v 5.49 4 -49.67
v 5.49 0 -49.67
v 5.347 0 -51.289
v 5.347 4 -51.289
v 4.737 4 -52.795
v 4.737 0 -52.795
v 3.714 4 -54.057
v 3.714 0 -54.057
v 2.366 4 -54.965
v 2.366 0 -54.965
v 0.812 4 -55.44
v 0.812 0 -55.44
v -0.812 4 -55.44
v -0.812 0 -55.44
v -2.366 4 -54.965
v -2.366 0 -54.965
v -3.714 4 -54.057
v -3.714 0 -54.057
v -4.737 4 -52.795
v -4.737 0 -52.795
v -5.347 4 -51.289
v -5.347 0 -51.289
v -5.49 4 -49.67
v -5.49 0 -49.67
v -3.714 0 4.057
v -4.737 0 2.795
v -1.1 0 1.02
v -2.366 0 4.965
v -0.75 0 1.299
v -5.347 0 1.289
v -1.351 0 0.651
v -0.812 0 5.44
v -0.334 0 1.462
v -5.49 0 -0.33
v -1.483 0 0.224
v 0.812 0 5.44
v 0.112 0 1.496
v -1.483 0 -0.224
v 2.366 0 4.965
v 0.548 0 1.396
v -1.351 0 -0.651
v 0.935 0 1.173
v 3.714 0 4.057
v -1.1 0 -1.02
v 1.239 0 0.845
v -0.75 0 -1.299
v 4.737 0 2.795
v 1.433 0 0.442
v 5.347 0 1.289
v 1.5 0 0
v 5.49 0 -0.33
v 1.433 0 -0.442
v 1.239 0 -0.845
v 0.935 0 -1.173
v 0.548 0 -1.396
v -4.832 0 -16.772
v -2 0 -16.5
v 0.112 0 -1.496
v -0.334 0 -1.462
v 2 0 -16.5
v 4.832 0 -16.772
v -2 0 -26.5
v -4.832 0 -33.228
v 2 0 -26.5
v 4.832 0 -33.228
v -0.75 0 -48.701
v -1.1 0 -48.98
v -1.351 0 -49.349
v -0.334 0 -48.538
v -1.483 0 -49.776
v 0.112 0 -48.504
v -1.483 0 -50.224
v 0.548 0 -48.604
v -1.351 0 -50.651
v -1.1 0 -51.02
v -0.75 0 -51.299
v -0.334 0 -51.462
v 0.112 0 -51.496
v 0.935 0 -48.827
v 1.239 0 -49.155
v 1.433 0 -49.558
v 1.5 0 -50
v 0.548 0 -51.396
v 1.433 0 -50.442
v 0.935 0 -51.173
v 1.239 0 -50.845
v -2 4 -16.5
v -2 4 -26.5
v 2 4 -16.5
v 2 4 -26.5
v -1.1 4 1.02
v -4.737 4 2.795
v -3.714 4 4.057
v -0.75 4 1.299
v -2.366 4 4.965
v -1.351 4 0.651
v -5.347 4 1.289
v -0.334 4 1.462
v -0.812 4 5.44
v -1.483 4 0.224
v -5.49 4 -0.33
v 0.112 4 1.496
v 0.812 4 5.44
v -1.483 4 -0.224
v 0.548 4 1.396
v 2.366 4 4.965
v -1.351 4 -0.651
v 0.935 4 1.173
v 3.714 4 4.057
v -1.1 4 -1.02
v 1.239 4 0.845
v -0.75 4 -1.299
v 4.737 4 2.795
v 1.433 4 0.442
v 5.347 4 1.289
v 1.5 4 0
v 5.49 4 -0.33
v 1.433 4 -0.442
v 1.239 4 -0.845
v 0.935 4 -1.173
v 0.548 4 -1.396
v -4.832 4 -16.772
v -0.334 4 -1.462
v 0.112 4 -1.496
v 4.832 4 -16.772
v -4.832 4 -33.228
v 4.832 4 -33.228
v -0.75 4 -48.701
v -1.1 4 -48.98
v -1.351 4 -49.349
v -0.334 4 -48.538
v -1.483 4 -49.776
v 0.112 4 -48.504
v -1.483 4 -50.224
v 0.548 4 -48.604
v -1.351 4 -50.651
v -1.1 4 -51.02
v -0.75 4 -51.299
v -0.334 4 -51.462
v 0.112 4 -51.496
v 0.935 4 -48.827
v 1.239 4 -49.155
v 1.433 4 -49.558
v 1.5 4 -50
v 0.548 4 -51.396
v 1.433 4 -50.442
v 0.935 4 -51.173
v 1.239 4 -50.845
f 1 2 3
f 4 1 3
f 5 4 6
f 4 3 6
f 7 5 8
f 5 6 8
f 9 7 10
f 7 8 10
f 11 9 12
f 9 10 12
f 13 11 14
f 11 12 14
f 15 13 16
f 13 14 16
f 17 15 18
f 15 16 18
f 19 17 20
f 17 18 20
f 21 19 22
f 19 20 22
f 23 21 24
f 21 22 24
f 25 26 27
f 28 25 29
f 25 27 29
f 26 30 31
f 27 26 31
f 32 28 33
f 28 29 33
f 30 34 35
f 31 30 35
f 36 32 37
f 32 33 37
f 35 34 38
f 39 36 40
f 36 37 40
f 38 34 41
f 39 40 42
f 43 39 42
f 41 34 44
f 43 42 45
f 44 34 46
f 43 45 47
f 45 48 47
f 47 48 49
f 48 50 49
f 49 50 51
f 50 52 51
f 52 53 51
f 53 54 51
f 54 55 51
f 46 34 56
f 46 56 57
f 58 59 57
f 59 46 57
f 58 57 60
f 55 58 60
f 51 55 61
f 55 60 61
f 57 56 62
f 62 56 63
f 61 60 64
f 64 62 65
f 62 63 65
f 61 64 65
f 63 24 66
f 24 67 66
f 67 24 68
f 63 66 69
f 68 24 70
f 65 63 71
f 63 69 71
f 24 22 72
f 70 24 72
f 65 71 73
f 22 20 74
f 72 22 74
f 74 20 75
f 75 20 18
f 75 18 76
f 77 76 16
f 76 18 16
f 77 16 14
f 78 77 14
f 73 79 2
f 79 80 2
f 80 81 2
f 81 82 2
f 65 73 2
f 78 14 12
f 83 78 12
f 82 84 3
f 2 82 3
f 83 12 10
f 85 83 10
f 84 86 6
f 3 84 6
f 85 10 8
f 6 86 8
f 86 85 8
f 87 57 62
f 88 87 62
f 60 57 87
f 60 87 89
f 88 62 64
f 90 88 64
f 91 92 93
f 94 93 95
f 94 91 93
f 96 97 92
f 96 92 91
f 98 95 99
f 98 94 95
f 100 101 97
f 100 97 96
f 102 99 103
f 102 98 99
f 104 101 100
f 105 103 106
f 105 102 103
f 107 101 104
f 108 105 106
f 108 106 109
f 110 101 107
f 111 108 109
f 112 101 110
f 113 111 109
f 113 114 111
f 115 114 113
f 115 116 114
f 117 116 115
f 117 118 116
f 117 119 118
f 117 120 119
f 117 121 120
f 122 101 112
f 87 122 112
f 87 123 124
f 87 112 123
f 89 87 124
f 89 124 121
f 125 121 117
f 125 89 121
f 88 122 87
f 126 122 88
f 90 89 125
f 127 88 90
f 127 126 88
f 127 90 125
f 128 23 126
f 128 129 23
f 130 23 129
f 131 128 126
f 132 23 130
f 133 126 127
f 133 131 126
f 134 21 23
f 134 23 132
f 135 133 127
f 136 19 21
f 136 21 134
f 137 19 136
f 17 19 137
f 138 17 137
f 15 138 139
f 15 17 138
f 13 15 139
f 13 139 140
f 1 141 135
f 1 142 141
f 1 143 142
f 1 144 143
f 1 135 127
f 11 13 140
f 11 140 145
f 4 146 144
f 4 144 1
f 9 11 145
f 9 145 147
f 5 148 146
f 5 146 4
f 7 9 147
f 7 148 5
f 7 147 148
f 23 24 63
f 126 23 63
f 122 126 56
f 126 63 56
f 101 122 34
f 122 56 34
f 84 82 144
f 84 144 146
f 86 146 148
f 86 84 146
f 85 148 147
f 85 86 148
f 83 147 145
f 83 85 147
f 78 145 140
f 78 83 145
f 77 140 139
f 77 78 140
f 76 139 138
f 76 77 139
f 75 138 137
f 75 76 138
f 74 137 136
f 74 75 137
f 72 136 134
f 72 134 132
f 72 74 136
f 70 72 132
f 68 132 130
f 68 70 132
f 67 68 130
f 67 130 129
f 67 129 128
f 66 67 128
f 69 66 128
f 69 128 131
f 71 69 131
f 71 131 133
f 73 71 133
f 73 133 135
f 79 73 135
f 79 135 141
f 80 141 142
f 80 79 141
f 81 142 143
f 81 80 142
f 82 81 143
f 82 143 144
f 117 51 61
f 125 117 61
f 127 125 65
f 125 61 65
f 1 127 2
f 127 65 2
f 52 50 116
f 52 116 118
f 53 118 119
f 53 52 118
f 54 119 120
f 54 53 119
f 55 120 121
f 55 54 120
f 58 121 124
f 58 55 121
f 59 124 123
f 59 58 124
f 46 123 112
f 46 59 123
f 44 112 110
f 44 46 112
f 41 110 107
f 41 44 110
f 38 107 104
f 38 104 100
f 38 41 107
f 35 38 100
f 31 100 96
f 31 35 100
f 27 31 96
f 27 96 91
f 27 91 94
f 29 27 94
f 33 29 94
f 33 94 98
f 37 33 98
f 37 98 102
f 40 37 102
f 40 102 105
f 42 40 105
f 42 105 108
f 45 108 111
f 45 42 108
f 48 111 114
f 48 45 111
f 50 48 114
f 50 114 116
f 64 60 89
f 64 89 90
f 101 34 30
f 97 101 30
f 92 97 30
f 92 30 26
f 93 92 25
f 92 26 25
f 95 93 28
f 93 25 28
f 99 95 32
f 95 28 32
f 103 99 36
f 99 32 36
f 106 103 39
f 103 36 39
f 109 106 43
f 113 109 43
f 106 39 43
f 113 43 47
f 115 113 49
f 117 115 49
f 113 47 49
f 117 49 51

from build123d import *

# Parameters (mm, degrees)
SKETCH1_R           = 1.5
SKETCH1_W           = 4
SKETCH1_H           = 10
BOSS_EXTRUDE1_DEPTH = 4


with BuildPart() as part:
    # Sketch1 → Boss-Extrude1 (new body)
    with BuildSketch(Plane(origin=(0, 0, 0), x_dir=(1, 0, 0), z_dir=(0, 1, 0))):
        with BuildLine():
            ThreePointArc((-5.490108902, 0.329703267), (0, -5.5), (5.490108902, 0.329703267))
            ThreePointArc((5.490108902, 0.329703267), (4.75, 25), (5.490108902, 49.670296733))
            ThreePointArc((5.490108902, 49.670296733), (0, 55.5), (-5.490108902, 49.670296733))
            ThreePointArc((-5.490108902, 49.670296733), (-4.75, 25), (-5.490108902, 0.329703267))
        make_face()
        Circle(SKETCH1_R, mode=Mode.SUBTRACT)
        with Locations((0, 50)):
            Circle(SKETCH1_R, mode=Mode.SUBTRACT)
        with Locations((0, 21.5)):
            Rectangle(SKETCH1_W, SKETCH1_H, mode=Mode.SUBTRACT)
    extrude(amount=BOSS_EXTRUDE1_DEPTH)


solid = part.part
